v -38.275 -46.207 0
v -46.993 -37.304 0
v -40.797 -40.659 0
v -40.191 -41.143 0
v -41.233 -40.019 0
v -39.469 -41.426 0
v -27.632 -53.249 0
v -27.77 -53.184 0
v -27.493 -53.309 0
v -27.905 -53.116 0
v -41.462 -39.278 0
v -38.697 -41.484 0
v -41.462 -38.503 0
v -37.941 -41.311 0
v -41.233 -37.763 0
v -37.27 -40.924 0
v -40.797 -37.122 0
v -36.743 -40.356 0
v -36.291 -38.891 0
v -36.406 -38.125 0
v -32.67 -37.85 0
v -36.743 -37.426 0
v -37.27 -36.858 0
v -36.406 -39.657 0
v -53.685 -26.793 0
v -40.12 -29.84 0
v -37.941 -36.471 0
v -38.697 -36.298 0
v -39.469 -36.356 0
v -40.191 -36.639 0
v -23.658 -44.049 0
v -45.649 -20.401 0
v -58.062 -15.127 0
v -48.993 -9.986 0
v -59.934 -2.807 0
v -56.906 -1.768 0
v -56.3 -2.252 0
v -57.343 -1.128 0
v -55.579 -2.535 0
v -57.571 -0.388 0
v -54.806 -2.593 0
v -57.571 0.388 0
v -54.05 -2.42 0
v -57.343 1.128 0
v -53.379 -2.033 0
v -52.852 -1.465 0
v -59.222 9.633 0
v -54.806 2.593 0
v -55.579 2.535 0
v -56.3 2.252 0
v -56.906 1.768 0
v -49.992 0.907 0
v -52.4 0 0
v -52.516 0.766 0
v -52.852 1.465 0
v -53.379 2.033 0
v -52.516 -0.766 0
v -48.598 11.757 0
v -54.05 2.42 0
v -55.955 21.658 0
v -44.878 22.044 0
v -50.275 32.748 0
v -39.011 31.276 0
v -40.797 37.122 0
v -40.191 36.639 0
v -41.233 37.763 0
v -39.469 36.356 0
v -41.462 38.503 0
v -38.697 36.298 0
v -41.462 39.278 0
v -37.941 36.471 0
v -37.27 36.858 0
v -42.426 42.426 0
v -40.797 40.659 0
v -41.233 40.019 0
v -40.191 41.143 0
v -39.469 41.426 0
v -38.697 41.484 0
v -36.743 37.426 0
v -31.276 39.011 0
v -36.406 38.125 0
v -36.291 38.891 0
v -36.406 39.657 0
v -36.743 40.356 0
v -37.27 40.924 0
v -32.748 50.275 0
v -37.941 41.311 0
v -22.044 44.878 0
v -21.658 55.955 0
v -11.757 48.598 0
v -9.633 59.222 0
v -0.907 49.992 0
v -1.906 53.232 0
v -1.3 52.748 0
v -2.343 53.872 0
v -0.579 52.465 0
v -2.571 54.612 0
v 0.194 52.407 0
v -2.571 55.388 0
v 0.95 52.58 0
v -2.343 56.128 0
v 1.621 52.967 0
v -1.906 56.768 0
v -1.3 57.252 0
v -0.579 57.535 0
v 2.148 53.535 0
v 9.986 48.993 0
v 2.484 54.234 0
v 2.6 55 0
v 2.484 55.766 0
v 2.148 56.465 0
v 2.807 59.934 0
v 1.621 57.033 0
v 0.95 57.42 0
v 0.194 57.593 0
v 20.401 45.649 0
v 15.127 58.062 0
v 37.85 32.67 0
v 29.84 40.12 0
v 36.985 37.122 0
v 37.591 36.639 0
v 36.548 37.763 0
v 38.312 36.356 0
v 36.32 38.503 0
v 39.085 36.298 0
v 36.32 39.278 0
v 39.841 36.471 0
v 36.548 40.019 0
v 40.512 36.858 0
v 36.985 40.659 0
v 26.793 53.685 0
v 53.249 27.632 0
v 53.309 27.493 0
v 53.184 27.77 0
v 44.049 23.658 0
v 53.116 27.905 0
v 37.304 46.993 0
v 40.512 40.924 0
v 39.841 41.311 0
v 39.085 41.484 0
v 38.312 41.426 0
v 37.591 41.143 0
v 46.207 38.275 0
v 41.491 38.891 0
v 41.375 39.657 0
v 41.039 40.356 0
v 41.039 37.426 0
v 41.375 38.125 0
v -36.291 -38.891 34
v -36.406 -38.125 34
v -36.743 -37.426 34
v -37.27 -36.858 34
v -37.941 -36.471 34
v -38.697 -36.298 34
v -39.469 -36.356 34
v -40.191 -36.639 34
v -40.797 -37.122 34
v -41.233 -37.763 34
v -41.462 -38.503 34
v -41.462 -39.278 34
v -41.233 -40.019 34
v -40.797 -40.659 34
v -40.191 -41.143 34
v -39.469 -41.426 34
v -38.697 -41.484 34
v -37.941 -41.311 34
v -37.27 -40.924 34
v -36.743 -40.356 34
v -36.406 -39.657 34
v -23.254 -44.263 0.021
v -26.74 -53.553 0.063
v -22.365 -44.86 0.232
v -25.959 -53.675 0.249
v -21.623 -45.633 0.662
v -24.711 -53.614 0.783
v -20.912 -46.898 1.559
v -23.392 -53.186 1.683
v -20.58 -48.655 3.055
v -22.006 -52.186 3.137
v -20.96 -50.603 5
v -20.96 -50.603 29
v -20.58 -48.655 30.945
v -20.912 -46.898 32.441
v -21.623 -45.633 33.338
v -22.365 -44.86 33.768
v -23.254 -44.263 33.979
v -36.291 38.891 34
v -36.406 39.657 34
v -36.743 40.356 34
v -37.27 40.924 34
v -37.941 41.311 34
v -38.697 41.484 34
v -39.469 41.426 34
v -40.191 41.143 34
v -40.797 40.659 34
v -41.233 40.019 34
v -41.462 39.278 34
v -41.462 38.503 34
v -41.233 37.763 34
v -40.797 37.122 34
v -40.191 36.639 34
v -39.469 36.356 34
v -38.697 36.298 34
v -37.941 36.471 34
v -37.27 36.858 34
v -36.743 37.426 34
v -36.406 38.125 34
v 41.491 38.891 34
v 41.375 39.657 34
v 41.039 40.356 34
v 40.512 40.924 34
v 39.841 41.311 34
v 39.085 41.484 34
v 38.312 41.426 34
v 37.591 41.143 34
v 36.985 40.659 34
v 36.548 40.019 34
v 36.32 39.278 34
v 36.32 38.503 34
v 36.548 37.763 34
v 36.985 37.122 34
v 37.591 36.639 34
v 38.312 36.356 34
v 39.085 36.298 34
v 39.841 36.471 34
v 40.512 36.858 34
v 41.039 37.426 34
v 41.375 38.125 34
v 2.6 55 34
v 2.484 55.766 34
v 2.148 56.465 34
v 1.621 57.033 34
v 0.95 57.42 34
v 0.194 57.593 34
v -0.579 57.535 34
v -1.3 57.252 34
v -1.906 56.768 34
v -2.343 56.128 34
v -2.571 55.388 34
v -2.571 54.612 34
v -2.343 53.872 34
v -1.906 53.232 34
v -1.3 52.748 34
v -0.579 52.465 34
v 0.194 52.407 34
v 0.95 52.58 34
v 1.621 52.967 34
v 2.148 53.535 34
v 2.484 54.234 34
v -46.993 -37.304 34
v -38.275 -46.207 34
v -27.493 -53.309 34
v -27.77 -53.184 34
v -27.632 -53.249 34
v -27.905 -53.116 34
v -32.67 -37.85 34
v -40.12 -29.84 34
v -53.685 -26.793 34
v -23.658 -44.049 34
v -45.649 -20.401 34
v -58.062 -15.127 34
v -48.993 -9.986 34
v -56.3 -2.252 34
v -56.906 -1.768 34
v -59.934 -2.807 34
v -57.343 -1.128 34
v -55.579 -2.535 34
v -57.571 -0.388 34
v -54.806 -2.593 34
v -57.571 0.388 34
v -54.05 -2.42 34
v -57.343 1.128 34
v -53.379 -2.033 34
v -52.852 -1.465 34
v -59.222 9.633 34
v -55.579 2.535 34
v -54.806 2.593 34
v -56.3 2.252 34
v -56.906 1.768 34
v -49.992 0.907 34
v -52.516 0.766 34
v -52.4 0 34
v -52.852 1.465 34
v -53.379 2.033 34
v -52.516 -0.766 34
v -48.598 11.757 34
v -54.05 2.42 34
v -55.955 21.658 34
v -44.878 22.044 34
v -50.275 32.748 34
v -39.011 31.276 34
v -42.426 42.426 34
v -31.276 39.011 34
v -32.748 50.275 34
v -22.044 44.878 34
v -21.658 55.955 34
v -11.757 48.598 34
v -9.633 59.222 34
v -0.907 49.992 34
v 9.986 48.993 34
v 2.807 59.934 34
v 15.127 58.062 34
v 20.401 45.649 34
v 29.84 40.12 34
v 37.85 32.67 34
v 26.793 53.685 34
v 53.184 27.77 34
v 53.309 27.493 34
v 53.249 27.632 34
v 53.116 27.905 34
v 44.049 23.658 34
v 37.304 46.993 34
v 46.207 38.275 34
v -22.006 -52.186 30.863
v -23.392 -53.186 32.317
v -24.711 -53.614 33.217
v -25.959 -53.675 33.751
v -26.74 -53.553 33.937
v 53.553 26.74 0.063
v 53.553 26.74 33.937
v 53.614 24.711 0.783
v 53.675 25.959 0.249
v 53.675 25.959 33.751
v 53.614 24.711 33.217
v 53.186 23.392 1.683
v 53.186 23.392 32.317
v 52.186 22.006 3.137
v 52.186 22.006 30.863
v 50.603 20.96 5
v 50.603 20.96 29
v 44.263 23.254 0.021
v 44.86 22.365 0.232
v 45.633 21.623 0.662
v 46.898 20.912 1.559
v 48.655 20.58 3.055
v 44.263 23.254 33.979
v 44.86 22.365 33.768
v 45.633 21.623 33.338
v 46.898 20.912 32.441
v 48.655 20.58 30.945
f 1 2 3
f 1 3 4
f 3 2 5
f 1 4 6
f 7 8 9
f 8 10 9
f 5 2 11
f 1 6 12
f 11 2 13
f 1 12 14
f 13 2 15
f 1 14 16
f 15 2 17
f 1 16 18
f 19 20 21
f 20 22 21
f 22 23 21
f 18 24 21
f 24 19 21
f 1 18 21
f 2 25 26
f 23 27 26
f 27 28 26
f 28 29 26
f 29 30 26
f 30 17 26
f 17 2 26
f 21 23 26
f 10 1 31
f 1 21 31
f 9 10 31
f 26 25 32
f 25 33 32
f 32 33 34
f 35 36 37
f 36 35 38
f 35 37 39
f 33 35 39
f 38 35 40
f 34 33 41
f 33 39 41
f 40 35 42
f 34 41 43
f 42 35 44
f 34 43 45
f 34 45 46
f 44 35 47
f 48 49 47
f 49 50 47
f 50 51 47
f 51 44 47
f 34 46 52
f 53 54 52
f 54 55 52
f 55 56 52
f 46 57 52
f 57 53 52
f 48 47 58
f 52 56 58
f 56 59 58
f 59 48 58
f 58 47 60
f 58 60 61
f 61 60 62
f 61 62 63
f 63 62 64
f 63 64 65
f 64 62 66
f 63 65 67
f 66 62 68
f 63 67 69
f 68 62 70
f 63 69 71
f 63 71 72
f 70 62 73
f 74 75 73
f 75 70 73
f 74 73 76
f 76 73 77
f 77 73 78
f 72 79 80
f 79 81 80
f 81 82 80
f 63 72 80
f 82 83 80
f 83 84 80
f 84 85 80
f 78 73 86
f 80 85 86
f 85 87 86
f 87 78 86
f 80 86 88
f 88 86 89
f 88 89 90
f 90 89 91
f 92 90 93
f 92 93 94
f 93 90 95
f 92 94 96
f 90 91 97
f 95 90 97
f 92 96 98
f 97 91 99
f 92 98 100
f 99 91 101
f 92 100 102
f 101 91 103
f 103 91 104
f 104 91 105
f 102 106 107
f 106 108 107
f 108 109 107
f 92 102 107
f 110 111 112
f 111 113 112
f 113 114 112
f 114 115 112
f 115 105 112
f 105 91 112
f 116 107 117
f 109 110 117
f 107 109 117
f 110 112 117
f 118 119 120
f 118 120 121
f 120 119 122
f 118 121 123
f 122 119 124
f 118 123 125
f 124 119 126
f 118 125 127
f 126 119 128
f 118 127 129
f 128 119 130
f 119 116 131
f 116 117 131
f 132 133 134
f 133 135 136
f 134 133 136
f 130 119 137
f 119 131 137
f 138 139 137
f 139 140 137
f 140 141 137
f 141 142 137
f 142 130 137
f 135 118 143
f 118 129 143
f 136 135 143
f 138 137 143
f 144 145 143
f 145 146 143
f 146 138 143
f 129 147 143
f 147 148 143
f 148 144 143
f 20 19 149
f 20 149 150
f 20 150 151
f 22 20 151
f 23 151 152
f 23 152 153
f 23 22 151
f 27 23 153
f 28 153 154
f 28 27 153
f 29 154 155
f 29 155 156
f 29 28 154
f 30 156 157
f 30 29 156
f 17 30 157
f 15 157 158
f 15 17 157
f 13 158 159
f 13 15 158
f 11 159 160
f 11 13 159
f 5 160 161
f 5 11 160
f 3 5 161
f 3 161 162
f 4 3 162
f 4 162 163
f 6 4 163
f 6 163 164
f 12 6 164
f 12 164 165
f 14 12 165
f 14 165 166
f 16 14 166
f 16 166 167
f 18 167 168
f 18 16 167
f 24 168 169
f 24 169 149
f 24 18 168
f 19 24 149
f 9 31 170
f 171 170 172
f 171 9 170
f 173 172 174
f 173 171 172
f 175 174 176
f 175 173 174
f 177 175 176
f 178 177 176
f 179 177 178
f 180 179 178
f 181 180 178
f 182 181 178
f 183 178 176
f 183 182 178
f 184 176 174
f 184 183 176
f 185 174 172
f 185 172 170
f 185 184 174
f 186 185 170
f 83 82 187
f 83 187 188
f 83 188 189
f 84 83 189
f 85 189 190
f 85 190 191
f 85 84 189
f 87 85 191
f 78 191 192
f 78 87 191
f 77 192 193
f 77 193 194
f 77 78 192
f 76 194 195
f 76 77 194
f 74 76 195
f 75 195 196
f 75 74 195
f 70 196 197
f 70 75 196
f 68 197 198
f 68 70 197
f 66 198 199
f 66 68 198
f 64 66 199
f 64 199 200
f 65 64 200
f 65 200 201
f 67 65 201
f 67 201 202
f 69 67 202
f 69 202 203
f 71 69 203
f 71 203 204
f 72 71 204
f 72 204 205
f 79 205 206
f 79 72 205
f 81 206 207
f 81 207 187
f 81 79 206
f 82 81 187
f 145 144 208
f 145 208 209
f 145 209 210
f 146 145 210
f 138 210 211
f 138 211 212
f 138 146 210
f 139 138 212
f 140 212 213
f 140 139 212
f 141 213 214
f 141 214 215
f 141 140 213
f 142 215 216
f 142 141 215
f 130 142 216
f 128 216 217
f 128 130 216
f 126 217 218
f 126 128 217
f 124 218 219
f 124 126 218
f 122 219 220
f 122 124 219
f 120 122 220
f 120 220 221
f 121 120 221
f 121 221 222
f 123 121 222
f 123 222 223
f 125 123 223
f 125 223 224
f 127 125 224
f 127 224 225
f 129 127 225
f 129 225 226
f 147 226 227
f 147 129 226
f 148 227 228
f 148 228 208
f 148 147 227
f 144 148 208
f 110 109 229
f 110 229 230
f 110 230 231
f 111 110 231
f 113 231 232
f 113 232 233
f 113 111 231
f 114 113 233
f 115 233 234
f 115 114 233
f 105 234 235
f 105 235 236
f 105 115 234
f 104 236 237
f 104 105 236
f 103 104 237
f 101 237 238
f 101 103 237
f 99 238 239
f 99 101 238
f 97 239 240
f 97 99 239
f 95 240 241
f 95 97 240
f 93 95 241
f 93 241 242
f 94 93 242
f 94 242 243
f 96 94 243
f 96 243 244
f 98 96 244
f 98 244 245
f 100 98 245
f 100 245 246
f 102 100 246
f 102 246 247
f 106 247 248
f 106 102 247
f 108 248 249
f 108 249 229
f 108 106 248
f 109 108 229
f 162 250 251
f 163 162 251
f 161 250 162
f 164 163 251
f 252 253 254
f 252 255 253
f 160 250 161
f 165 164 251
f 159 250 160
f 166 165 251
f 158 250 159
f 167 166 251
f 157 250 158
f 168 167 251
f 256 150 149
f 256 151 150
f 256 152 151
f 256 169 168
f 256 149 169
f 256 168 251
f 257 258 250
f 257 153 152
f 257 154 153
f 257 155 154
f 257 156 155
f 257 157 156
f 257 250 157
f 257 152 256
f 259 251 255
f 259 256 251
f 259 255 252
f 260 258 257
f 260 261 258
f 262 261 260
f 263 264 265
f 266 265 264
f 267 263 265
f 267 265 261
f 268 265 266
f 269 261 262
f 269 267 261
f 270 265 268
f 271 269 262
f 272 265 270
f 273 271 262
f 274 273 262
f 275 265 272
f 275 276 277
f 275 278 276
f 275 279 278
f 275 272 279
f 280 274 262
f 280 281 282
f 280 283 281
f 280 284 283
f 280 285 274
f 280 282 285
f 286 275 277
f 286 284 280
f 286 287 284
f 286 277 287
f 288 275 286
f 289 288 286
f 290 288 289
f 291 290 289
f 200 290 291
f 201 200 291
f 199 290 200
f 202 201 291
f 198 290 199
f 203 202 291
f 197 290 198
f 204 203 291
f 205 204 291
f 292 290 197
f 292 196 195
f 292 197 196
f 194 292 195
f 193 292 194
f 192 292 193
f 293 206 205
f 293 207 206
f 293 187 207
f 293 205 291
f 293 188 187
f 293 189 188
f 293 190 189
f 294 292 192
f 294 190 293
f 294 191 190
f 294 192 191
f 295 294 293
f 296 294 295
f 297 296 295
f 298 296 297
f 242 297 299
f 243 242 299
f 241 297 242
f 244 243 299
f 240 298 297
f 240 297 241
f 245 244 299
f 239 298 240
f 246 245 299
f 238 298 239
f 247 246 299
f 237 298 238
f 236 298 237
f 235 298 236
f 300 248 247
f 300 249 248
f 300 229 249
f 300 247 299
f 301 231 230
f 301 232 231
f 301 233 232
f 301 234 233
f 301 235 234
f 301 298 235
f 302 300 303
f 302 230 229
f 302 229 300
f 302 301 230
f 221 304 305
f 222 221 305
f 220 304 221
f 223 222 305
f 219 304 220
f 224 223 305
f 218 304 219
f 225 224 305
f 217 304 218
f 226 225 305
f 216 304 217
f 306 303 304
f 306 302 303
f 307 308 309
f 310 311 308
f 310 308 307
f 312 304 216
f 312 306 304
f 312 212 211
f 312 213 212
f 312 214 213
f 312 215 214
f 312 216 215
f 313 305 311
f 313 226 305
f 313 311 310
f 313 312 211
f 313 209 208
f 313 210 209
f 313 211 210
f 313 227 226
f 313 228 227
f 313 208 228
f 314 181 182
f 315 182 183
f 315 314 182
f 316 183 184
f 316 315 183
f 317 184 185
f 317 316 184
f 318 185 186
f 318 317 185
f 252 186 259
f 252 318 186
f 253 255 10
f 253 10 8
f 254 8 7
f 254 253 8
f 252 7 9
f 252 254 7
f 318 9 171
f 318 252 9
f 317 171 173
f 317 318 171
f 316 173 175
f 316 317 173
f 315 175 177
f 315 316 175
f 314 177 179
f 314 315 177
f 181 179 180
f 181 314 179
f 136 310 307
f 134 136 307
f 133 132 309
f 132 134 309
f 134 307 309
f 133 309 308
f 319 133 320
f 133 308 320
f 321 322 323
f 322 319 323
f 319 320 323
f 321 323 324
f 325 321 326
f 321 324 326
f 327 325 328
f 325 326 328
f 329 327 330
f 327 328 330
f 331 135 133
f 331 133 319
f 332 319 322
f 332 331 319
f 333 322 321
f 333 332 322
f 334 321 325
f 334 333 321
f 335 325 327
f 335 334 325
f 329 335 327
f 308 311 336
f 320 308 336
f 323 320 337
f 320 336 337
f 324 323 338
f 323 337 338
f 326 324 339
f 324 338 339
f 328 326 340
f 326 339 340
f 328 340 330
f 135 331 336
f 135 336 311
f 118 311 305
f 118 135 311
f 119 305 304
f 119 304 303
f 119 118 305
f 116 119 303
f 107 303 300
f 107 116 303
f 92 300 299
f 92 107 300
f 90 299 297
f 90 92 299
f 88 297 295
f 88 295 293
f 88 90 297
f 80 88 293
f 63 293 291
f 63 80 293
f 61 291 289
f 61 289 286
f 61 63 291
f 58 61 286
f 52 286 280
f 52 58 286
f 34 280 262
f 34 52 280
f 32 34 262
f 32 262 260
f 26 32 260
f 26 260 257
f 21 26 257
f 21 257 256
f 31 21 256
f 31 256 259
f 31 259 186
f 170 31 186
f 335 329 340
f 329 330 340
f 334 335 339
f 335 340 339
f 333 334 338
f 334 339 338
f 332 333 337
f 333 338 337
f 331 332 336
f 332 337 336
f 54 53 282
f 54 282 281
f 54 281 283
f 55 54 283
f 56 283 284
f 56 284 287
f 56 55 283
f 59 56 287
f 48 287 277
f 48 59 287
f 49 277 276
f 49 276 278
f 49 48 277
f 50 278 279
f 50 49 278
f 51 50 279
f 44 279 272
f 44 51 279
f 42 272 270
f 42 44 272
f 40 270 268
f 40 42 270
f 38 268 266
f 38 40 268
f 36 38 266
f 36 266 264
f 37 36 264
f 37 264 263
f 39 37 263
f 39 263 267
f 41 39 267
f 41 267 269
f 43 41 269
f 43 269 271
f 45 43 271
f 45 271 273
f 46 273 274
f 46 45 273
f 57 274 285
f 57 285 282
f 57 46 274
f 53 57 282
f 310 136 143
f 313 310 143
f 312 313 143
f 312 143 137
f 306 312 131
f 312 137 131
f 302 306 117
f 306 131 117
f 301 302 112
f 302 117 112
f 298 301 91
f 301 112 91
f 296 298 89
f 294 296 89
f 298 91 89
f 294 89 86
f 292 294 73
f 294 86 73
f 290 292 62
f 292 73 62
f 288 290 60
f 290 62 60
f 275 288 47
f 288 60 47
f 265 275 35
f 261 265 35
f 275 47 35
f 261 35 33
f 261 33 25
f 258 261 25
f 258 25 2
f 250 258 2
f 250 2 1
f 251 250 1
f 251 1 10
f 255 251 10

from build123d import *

# Parameters (mm, degrees)
SKETCH_2_R          = 60
SKETCH_2_R_2        = 2.6
SKETCH_2_R_3        = 50
EXTRUDE_1_DEPTH     = 34
CUT_EXTRUDE_START   = -34
SKETCH_3_R          = 2.6
CUT_EXTRUDE_1_DEPTH = 34
FILLET_1_R          = 5


with BuildPart() as part:
    # 草图2 → 凸台-拉伸1 (new body)
    with BuildSketch(Plane.XY):
        Circle(SKETCH_2_R)
        with Locations((0, 55)):
            Circle(SKETCH_2_R_2, mode=Mode.SUBTRACT)
        with Locations((38.890872965, 38.890872965)):
            Circle(SKETCH_2_R_2, mode=Mode.SUBTRACT)
        with Locations((55, 0)):
            Circle(SKETCH_2_R_2, mode=Mode.SUBTRACT)
        with Locations((38.890872965, -38.890872965)):
            Circle(SKETCH_2_R_2, mode=Mode.SUBTRACT)
        with Locations((0, -55)):
            Circle(SKETCH_2_R_2, mode=Mode.SUBTRACT)
        with Locations((-38.890872965, -38.890872965)):
            Circle(SKETCH_2_R_2, mode=Mode.SUBTRACT)
        with Locations((-55, 0)):
            Circle(SKETCH_2_R_2, mode=Mode.SUBTRACT)
        with Locations((-38.890872965, 38.890872965)):
            Circle(SKETCH_2_R_2, mode=Mode.SUBTRACT)
        Circle(SKETCH_2_R_3, mode=Mode.SUBTRACT)
    extrude(amount=EXTRUDE_1_DEPTH)

    # 草图3 → 切除-拉伸1 (cut)
    with BuildSketch(Plane.XY.offset(34).offset(CUT_EXTRUDE_START)):
        with BuildLine():
            Line((55.432771951, 22.961005942), (46.193976626, 19.134171618))
            ThreePointArc((46.193976626, 19.134171618), (49.03926402, 9.754516101), (50, 0))
            ThreePointArc((50, 0), (27.778511651, -41.573480615), (-19.134171618, -46.193976626))
            Line((-19.134171618, -46.193976626), (-22.961005942, -55.432771951))
            ThreePointArc((-22.961005942, -55.432771951), (33.334213981, -49.888176738), (60, 0))
            ThreePointArc((60, 0), (58.847116824, 11.705419321), (55.432771951, 22.961005942))
        make_face()
        with Locations((0, -55)):
            Circle(SKETCH_3_R, mode=Mode.SUBTRACT)
        with Locations((38.890872965, -38.890872965)):
            Circle(SKETCH_3_R, mode=Mode.SUBTRACT)
        with Locations((55, 0)):
            Circle(SKETCH_3_R, mode=Mode.SUBTRACT)
    extrude(amount=CUT_EXTRUDE_1_DEPTH, mode=Mode.SUBTRACT)

    # 圆角1
    fillet_1_edges = [part.edges().sort_by_distance(p)[0] for p in [
        (-19.134171618, -46.193976626, 17),
        (50.813374288, 21.04758878, 34),
        (46.193976626, 19.134171618, 17),
        (55.432771951, 22.961005942, 17),
        (-21.04758878, -50.813374288, 0),
        (-22.961005942, -55.432771951, 17),
        (50.813374288, 21.04758878, 0),
        (-21.04758878, -50.813374288, 34),
    ]]
    fillet(fillet_1_edges, radius=FILLET_1_R - 0.0001)  # a hair under: the kernel refuses the full size


solid = part.part
